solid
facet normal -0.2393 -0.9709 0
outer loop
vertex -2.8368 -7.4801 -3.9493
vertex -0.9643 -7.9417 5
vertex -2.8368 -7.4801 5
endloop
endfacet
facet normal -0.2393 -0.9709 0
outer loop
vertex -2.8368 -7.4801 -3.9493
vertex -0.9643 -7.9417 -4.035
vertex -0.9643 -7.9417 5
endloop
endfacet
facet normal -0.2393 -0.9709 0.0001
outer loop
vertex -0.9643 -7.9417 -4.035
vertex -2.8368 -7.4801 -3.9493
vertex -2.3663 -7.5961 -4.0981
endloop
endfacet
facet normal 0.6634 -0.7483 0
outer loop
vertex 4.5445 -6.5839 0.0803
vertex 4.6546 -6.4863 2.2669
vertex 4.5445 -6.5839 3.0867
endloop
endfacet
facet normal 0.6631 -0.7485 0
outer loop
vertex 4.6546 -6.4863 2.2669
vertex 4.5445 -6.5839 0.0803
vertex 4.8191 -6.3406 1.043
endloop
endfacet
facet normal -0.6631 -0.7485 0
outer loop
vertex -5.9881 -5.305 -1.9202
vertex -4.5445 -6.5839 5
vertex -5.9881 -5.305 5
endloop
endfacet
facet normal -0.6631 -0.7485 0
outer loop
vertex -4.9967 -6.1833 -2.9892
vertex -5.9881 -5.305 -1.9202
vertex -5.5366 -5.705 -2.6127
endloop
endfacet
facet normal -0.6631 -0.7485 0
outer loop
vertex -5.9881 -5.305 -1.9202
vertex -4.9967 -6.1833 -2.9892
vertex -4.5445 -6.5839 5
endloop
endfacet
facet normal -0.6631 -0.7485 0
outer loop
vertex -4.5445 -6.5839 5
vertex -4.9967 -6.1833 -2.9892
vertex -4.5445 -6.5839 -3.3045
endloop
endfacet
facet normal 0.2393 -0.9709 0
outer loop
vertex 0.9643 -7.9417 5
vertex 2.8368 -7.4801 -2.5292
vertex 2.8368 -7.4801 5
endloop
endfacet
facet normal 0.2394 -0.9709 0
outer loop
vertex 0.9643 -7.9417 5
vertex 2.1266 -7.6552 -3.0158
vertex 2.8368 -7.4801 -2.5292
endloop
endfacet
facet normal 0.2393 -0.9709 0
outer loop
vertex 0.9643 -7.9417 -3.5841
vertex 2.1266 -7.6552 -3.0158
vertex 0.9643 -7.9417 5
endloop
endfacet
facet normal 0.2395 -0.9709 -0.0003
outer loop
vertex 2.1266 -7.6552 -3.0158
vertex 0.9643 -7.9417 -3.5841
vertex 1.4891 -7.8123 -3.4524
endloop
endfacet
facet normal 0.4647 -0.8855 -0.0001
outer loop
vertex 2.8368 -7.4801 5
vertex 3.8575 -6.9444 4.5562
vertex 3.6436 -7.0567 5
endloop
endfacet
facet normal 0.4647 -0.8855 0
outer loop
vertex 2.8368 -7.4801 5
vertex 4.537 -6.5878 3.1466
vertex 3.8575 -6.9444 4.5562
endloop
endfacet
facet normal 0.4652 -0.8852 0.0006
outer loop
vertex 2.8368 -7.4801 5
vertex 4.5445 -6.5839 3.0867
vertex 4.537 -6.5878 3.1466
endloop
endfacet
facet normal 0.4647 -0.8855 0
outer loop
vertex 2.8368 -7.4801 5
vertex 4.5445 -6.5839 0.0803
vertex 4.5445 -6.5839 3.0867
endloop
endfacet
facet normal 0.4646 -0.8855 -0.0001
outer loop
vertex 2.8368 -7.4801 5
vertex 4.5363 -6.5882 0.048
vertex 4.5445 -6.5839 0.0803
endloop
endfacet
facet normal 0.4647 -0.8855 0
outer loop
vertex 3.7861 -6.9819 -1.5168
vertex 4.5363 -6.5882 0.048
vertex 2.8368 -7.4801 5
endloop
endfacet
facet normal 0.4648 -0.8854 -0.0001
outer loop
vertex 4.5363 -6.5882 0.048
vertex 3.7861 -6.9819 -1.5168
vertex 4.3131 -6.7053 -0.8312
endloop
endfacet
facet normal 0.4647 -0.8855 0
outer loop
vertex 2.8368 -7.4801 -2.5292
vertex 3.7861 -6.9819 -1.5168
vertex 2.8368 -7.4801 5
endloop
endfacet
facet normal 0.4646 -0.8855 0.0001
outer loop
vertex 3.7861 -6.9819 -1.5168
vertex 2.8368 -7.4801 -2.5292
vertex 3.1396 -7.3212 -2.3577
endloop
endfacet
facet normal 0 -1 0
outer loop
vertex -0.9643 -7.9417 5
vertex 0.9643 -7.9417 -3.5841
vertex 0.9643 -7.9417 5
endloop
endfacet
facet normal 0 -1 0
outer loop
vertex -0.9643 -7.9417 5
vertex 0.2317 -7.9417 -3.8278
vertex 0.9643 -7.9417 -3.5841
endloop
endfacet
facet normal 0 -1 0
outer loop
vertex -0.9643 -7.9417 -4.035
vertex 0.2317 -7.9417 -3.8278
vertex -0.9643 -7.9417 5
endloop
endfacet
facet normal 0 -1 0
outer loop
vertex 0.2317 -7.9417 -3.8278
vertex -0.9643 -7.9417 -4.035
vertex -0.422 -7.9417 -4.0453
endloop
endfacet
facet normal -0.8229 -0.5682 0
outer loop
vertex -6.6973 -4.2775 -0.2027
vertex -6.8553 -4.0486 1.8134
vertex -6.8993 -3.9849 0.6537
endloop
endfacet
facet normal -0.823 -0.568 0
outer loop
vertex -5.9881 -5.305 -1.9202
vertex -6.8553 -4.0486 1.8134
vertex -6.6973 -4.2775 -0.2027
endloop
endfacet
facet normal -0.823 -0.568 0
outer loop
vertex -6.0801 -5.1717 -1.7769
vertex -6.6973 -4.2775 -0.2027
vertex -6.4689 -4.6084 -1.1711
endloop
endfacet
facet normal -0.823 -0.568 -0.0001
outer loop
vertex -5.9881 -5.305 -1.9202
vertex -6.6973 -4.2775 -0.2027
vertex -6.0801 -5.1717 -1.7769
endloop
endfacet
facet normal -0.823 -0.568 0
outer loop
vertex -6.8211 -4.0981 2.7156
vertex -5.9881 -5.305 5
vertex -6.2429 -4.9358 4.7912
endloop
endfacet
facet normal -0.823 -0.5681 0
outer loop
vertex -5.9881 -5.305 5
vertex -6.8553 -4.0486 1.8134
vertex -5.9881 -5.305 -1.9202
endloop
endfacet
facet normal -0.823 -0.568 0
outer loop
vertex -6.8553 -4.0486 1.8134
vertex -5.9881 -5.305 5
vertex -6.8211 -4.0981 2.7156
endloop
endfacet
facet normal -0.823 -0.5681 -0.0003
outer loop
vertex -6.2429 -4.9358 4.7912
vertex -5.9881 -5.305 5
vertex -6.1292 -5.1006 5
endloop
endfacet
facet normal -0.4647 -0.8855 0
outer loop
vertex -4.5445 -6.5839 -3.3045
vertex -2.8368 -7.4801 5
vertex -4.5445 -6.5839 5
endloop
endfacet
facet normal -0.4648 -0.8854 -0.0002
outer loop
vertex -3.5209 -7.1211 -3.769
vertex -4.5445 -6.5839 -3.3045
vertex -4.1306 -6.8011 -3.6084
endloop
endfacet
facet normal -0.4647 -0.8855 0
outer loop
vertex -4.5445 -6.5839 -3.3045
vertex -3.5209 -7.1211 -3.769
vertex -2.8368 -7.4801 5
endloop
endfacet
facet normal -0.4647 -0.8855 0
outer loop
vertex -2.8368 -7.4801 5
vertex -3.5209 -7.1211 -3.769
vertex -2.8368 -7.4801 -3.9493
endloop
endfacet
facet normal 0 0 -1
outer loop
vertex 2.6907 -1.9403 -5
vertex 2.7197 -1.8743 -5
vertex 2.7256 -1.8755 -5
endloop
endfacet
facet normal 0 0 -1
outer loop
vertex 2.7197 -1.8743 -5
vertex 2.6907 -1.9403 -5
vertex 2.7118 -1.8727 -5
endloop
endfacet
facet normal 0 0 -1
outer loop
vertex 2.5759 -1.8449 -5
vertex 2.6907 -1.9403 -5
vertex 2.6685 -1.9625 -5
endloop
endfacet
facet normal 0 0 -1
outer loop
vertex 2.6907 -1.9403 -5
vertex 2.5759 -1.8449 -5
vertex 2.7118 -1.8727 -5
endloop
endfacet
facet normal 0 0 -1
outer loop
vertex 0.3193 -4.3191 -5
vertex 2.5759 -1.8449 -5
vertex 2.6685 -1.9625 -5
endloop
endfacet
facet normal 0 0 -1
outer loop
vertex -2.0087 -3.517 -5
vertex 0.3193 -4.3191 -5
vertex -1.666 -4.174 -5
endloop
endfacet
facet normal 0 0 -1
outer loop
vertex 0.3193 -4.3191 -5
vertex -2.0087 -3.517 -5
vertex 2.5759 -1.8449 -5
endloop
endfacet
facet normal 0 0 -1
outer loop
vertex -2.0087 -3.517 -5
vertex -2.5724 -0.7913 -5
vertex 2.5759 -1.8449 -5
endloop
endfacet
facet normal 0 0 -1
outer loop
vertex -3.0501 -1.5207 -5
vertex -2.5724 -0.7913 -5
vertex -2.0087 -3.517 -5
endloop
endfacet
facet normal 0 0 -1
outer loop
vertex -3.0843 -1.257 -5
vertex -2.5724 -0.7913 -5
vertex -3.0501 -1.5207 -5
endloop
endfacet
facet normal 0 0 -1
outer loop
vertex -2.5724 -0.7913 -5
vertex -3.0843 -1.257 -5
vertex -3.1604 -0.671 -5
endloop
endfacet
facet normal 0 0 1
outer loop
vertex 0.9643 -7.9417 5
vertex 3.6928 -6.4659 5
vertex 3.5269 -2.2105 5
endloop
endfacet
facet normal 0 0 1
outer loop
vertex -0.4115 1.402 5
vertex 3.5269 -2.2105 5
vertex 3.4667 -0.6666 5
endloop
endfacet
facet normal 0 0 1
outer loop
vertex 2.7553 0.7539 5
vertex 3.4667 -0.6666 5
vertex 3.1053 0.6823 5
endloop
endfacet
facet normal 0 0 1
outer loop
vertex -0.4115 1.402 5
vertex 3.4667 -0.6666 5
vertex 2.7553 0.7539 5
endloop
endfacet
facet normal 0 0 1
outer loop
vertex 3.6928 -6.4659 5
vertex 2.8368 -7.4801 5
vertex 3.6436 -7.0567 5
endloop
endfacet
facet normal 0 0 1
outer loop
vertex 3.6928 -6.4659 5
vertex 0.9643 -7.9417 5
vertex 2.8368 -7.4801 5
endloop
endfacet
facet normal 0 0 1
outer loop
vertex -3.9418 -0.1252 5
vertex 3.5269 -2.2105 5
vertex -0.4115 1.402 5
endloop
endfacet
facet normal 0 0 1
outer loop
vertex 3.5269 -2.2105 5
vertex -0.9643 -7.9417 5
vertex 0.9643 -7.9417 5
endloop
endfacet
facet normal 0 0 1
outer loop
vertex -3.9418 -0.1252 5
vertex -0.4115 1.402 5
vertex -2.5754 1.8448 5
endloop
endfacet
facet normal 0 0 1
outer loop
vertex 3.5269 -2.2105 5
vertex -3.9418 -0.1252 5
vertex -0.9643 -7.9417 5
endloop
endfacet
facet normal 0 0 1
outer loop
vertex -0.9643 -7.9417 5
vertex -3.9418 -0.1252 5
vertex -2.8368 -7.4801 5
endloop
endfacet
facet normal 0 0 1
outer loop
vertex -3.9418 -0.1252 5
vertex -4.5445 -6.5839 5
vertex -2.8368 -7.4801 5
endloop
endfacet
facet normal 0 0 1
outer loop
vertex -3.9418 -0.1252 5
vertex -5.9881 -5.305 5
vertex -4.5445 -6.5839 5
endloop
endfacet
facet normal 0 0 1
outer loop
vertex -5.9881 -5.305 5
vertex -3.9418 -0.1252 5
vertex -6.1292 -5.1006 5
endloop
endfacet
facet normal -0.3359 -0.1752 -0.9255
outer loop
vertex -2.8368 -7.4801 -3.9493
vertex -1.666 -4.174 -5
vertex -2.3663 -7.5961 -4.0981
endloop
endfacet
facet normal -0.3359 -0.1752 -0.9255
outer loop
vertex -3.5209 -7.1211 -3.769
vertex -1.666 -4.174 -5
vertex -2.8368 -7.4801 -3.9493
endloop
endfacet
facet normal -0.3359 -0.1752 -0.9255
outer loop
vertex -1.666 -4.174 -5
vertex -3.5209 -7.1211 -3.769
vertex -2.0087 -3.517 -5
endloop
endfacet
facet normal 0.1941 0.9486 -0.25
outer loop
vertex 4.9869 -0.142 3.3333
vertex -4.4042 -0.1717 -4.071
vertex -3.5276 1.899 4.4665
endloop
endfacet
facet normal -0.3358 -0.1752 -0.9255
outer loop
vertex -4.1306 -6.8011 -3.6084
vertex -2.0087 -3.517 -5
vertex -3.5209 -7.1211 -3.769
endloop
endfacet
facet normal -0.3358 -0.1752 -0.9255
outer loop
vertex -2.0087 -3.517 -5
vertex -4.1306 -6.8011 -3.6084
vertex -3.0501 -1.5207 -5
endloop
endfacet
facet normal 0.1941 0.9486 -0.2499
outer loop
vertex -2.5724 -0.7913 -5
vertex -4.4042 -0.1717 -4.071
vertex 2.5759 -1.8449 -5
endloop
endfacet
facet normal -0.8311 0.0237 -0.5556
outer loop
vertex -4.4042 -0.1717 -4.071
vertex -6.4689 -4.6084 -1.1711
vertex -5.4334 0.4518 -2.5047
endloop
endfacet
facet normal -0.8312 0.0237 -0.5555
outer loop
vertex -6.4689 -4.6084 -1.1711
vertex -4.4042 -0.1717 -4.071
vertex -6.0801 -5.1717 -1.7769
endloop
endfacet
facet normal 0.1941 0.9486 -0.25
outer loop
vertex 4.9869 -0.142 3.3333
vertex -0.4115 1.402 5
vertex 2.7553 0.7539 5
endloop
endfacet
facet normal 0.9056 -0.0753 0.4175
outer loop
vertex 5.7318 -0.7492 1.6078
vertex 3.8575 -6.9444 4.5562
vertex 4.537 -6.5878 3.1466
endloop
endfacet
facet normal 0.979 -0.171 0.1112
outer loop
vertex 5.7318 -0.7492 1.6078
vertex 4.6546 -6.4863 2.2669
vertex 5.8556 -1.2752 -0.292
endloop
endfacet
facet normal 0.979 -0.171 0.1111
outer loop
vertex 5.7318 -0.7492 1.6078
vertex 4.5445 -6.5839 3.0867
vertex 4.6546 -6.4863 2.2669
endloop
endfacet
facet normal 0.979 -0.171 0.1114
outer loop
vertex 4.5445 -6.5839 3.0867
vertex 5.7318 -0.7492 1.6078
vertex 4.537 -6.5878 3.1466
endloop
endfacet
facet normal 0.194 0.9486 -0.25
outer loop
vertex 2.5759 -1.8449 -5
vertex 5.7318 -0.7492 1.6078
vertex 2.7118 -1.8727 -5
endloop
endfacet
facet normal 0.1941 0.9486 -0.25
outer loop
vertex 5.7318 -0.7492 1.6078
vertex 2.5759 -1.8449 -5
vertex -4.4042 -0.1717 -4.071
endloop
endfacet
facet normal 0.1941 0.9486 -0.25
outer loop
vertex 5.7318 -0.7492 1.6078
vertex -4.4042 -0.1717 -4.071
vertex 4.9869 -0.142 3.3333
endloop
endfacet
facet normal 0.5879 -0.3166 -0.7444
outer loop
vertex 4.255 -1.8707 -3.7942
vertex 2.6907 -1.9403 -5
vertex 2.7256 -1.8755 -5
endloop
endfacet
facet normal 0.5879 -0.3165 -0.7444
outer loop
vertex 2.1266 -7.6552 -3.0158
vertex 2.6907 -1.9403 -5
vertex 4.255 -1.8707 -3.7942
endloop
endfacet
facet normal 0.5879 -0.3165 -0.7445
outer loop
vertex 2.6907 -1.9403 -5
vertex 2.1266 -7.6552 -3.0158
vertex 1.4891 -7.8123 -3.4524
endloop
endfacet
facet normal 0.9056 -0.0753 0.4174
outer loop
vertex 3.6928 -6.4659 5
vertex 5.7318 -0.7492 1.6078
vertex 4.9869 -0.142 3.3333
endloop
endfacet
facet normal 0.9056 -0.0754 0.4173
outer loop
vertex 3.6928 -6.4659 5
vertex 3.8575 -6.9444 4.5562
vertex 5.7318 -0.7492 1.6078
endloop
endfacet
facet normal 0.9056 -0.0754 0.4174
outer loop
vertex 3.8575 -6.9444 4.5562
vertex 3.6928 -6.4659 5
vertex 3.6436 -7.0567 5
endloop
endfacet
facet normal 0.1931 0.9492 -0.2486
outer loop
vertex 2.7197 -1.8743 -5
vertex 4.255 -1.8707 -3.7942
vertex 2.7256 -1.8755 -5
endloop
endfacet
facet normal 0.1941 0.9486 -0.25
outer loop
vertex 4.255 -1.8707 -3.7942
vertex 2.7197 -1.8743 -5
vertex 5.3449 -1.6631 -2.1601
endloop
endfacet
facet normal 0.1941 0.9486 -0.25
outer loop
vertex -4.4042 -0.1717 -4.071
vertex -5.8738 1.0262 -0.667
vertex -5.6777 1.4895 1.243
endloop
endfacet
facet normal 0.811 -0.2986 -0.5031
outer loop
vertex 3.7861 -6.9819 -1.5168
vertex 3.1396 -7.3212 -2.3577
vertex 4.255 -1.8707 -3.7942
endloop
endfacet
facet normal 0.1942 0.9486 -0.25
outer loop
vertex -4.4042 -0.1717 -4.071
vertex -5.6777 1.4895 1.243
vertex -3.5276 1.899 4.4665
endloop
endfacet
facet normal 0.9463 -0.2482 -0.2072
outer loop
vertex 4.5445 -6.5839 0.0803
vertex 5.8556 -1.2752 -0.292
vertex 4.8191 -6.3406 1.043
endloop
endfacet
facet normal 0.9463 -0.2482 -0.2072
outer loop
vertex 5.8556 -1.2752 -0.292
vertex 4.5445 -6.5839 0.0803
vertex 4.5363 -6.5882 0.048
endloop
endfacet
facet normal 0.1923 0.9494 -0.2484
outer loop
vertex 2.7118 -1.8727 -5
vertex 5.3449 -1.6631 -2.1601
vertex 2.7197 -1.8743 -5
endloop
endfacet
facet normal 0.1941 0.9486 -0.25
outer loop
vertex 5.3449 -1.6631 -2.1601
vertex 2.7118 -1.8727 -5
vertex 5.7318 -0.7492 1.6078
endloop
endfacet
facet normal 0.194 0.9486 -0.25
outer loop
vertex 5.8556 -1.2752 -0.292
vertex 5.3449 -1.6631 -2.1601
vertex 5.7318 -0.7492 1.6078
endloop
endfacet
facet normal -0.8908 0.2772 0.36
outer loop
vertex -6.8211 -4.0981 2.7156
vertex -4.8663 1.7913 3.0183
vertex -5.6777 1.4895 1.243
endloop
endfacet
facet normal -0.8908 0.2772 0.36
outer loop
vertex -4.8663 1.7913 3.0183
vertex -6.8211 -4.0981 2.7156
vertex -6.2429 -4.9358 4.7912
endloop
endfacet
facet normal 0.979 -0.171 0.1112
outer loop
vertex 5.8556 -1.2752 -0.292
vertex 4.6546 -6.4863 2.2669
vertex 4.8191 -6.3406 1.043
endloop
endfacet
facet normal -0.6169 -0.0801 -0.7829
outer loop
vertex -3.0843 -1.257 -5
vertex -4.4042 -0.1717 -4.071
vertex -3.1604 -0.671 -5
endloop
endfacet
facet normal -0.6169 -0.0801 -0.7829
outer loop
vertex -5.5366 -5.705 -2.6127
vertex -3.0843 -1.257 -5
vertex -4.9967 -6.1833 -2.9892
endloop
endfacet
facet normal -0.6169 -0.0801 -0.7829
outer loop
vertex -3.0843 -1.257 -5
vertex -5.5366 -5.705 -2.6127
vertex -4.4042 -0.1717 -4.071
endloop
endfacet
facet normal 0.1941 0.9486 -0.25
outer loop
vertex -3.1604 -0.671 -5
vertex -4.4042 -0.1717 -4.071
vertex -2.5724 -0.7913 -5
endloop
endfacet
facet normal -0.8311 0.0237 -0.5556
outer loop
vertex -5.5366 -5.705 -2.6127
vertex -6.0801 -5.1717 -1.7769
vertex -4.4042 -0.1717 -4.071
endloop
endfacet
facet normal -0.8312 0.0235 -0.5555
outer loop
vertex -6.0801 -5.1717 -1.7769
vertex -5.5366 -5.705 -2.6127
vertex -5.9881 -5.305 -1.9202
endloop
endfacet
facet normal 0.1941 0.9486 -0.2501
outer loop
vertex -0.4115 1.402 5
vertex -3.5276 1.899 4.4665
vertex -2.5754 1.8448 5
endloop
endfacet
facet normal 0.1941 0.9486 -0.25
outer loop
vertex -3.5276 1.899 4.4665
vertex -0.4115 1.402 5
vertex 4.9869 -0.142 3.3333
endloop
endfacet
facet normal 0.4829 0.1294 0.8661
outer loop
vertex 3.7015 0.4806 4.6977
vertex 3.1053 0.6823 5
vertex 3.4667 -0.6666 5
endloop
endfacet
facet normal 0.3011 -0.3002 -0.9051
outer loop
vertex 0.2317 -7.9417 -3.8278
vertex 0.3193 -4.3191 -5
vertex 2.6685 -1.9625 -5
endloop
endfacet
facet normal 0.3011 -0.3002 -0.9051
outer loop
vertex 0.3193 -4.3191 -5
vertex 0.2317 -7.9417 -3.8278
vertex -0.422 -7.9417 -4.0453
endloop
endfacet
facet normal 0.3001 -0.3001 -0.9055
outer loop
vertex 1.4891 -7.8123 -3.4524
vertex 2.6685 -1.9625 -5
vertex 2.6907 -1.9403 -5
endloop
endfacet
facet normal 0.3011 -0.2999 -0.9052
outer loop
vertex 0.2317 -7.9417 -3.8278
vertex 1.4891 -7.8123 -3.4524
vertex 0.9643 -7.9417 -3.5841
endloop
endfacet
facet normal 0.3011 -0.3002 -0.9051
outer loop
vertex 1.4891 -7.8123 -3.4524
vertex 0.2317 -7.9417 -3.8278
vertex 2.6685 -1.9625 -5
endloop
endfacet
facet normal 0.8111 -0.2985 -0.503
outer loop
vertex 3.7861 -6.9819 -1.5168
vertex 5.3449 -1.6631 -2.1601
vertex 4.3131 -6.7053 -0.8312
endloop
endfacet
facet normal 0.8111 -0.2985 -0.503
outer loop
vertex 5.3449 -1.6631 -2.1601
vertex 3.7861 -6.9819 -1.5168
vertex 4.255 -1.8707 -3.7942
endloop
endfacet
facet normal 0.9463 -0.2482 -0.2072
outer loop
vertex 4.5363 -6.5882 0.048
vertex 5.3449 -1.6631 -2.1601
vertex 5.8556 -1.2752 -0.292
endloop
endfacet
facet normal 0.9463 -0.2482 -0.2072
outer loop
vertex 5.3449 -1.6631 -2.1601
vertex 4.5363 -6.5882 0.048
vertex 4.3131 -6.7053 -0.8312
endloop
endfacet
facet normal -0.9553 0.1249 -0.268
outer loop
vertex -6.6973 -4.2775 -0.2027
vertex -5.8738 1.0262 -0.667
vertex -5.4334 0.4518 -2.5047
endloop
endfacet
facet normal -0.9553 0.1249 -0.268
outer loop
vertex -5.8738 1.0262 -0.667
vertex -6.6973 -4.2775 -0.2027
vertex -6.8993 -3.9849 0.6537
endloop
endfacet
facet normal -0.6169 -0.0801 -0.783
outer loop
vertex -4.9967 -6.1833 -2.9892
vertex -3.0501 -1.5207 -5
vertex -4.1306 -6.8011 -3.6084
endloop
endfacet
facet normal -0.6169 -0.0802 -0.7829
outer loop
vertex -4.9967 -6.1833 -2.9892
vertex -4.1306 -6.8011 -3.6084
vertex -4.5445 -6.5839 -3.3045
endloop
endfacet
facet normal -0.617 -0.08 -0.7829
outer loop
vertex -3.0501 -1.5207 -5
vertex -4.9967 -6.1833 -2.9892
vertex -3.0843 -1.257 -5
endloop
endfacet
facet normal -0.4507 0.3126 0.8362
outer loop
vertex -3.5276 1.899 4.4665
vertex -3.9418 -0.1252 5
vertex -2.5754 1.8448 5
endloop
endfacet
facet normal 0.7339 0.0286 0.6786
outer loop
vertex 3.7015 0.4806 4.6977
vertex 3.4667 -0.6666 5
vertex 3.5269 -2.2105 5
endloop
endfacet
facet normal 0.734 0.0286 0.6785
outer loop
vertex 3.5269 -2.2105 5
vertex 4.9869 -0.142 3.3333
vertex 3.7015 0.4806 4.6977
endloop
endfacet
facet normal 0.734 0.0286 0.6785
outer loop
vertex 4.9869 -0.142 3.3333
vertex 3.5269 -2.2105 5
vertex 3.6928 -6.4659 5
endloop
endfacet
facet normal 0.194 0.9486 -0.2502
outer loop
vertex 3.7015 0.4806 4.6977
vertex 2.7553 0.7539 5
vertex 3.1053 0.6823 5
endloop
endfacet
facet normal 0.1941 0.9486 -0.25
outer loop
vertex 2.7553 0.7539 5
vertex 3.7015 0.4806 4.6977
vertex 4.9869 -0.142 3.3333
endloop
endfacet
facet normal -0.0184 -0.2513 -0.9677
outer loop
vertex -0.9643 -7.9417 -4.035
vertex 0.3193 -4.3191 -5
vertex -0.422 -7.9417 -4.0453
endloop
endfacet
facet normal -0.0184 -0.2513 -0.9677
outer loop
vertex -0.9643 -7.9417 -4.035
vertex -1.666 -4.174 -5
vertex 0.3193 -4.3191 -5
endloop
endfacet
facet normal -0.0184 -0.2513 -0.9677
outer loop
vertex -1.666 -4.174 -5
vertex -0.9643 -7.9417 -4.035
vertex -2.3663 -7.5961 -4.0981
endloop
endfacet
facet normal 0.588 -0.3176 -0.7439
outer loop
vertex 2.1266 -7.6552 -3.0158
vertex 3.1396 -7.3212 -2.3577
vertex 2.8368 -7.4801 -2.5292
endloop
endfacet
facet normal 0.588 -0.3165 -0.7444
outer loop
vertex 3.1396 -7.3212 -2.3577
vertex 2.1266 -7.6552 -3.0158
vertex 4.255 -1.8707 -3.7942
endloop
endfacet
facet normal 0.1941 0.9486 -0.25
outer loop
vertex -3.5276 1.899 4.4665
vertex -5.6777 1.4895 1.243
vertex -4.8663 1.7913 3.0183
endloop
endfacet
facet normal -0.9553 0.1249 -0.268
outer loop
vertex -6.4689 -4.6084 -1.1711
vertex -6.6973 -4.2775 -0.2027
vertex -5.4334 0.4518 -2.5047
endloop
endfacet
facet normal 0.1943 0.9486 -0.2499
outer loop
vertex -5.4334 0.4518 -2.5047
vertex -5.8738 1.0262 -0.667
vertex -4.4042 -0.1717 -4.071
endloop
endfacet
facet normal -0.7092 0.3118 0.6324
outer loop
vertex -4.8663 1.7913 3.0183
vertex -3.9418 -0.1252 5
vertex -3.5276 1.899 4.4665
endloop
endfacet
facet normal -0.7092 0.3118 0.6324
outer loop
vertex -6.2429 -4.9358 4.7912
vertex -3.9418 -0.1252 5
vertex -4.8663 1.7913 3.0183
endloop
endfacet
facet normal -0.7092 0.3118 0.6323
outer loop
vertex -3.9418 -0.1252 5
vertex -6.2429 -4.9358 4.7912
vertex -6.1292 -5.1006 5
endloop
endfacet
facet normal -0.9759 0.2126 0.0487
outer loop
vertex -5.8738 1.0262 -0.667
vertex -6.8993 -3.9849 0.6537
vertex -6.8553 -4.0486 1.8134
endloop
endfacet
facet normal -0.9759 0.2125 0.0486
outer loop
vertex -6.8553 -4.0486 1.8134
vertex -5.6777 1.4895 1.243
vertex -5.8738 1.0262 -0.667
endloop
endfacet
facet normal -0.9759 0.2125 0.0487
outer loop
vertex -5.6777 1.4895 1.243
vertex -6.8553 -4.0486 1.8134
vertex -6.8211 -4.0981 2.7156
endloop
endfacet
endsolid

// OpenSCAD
// Generated by generate_scads.py
intersection() {
  rotate([120,120,15]) {
    cylinder(h=10, r=6, center=false);
  }
  intersection() {
    cylinder(h=30, r=8, center=true);
    cylinder(h=10, r=12, center=true);
    cube(size=[15,25,30], center=true);
  }
}
